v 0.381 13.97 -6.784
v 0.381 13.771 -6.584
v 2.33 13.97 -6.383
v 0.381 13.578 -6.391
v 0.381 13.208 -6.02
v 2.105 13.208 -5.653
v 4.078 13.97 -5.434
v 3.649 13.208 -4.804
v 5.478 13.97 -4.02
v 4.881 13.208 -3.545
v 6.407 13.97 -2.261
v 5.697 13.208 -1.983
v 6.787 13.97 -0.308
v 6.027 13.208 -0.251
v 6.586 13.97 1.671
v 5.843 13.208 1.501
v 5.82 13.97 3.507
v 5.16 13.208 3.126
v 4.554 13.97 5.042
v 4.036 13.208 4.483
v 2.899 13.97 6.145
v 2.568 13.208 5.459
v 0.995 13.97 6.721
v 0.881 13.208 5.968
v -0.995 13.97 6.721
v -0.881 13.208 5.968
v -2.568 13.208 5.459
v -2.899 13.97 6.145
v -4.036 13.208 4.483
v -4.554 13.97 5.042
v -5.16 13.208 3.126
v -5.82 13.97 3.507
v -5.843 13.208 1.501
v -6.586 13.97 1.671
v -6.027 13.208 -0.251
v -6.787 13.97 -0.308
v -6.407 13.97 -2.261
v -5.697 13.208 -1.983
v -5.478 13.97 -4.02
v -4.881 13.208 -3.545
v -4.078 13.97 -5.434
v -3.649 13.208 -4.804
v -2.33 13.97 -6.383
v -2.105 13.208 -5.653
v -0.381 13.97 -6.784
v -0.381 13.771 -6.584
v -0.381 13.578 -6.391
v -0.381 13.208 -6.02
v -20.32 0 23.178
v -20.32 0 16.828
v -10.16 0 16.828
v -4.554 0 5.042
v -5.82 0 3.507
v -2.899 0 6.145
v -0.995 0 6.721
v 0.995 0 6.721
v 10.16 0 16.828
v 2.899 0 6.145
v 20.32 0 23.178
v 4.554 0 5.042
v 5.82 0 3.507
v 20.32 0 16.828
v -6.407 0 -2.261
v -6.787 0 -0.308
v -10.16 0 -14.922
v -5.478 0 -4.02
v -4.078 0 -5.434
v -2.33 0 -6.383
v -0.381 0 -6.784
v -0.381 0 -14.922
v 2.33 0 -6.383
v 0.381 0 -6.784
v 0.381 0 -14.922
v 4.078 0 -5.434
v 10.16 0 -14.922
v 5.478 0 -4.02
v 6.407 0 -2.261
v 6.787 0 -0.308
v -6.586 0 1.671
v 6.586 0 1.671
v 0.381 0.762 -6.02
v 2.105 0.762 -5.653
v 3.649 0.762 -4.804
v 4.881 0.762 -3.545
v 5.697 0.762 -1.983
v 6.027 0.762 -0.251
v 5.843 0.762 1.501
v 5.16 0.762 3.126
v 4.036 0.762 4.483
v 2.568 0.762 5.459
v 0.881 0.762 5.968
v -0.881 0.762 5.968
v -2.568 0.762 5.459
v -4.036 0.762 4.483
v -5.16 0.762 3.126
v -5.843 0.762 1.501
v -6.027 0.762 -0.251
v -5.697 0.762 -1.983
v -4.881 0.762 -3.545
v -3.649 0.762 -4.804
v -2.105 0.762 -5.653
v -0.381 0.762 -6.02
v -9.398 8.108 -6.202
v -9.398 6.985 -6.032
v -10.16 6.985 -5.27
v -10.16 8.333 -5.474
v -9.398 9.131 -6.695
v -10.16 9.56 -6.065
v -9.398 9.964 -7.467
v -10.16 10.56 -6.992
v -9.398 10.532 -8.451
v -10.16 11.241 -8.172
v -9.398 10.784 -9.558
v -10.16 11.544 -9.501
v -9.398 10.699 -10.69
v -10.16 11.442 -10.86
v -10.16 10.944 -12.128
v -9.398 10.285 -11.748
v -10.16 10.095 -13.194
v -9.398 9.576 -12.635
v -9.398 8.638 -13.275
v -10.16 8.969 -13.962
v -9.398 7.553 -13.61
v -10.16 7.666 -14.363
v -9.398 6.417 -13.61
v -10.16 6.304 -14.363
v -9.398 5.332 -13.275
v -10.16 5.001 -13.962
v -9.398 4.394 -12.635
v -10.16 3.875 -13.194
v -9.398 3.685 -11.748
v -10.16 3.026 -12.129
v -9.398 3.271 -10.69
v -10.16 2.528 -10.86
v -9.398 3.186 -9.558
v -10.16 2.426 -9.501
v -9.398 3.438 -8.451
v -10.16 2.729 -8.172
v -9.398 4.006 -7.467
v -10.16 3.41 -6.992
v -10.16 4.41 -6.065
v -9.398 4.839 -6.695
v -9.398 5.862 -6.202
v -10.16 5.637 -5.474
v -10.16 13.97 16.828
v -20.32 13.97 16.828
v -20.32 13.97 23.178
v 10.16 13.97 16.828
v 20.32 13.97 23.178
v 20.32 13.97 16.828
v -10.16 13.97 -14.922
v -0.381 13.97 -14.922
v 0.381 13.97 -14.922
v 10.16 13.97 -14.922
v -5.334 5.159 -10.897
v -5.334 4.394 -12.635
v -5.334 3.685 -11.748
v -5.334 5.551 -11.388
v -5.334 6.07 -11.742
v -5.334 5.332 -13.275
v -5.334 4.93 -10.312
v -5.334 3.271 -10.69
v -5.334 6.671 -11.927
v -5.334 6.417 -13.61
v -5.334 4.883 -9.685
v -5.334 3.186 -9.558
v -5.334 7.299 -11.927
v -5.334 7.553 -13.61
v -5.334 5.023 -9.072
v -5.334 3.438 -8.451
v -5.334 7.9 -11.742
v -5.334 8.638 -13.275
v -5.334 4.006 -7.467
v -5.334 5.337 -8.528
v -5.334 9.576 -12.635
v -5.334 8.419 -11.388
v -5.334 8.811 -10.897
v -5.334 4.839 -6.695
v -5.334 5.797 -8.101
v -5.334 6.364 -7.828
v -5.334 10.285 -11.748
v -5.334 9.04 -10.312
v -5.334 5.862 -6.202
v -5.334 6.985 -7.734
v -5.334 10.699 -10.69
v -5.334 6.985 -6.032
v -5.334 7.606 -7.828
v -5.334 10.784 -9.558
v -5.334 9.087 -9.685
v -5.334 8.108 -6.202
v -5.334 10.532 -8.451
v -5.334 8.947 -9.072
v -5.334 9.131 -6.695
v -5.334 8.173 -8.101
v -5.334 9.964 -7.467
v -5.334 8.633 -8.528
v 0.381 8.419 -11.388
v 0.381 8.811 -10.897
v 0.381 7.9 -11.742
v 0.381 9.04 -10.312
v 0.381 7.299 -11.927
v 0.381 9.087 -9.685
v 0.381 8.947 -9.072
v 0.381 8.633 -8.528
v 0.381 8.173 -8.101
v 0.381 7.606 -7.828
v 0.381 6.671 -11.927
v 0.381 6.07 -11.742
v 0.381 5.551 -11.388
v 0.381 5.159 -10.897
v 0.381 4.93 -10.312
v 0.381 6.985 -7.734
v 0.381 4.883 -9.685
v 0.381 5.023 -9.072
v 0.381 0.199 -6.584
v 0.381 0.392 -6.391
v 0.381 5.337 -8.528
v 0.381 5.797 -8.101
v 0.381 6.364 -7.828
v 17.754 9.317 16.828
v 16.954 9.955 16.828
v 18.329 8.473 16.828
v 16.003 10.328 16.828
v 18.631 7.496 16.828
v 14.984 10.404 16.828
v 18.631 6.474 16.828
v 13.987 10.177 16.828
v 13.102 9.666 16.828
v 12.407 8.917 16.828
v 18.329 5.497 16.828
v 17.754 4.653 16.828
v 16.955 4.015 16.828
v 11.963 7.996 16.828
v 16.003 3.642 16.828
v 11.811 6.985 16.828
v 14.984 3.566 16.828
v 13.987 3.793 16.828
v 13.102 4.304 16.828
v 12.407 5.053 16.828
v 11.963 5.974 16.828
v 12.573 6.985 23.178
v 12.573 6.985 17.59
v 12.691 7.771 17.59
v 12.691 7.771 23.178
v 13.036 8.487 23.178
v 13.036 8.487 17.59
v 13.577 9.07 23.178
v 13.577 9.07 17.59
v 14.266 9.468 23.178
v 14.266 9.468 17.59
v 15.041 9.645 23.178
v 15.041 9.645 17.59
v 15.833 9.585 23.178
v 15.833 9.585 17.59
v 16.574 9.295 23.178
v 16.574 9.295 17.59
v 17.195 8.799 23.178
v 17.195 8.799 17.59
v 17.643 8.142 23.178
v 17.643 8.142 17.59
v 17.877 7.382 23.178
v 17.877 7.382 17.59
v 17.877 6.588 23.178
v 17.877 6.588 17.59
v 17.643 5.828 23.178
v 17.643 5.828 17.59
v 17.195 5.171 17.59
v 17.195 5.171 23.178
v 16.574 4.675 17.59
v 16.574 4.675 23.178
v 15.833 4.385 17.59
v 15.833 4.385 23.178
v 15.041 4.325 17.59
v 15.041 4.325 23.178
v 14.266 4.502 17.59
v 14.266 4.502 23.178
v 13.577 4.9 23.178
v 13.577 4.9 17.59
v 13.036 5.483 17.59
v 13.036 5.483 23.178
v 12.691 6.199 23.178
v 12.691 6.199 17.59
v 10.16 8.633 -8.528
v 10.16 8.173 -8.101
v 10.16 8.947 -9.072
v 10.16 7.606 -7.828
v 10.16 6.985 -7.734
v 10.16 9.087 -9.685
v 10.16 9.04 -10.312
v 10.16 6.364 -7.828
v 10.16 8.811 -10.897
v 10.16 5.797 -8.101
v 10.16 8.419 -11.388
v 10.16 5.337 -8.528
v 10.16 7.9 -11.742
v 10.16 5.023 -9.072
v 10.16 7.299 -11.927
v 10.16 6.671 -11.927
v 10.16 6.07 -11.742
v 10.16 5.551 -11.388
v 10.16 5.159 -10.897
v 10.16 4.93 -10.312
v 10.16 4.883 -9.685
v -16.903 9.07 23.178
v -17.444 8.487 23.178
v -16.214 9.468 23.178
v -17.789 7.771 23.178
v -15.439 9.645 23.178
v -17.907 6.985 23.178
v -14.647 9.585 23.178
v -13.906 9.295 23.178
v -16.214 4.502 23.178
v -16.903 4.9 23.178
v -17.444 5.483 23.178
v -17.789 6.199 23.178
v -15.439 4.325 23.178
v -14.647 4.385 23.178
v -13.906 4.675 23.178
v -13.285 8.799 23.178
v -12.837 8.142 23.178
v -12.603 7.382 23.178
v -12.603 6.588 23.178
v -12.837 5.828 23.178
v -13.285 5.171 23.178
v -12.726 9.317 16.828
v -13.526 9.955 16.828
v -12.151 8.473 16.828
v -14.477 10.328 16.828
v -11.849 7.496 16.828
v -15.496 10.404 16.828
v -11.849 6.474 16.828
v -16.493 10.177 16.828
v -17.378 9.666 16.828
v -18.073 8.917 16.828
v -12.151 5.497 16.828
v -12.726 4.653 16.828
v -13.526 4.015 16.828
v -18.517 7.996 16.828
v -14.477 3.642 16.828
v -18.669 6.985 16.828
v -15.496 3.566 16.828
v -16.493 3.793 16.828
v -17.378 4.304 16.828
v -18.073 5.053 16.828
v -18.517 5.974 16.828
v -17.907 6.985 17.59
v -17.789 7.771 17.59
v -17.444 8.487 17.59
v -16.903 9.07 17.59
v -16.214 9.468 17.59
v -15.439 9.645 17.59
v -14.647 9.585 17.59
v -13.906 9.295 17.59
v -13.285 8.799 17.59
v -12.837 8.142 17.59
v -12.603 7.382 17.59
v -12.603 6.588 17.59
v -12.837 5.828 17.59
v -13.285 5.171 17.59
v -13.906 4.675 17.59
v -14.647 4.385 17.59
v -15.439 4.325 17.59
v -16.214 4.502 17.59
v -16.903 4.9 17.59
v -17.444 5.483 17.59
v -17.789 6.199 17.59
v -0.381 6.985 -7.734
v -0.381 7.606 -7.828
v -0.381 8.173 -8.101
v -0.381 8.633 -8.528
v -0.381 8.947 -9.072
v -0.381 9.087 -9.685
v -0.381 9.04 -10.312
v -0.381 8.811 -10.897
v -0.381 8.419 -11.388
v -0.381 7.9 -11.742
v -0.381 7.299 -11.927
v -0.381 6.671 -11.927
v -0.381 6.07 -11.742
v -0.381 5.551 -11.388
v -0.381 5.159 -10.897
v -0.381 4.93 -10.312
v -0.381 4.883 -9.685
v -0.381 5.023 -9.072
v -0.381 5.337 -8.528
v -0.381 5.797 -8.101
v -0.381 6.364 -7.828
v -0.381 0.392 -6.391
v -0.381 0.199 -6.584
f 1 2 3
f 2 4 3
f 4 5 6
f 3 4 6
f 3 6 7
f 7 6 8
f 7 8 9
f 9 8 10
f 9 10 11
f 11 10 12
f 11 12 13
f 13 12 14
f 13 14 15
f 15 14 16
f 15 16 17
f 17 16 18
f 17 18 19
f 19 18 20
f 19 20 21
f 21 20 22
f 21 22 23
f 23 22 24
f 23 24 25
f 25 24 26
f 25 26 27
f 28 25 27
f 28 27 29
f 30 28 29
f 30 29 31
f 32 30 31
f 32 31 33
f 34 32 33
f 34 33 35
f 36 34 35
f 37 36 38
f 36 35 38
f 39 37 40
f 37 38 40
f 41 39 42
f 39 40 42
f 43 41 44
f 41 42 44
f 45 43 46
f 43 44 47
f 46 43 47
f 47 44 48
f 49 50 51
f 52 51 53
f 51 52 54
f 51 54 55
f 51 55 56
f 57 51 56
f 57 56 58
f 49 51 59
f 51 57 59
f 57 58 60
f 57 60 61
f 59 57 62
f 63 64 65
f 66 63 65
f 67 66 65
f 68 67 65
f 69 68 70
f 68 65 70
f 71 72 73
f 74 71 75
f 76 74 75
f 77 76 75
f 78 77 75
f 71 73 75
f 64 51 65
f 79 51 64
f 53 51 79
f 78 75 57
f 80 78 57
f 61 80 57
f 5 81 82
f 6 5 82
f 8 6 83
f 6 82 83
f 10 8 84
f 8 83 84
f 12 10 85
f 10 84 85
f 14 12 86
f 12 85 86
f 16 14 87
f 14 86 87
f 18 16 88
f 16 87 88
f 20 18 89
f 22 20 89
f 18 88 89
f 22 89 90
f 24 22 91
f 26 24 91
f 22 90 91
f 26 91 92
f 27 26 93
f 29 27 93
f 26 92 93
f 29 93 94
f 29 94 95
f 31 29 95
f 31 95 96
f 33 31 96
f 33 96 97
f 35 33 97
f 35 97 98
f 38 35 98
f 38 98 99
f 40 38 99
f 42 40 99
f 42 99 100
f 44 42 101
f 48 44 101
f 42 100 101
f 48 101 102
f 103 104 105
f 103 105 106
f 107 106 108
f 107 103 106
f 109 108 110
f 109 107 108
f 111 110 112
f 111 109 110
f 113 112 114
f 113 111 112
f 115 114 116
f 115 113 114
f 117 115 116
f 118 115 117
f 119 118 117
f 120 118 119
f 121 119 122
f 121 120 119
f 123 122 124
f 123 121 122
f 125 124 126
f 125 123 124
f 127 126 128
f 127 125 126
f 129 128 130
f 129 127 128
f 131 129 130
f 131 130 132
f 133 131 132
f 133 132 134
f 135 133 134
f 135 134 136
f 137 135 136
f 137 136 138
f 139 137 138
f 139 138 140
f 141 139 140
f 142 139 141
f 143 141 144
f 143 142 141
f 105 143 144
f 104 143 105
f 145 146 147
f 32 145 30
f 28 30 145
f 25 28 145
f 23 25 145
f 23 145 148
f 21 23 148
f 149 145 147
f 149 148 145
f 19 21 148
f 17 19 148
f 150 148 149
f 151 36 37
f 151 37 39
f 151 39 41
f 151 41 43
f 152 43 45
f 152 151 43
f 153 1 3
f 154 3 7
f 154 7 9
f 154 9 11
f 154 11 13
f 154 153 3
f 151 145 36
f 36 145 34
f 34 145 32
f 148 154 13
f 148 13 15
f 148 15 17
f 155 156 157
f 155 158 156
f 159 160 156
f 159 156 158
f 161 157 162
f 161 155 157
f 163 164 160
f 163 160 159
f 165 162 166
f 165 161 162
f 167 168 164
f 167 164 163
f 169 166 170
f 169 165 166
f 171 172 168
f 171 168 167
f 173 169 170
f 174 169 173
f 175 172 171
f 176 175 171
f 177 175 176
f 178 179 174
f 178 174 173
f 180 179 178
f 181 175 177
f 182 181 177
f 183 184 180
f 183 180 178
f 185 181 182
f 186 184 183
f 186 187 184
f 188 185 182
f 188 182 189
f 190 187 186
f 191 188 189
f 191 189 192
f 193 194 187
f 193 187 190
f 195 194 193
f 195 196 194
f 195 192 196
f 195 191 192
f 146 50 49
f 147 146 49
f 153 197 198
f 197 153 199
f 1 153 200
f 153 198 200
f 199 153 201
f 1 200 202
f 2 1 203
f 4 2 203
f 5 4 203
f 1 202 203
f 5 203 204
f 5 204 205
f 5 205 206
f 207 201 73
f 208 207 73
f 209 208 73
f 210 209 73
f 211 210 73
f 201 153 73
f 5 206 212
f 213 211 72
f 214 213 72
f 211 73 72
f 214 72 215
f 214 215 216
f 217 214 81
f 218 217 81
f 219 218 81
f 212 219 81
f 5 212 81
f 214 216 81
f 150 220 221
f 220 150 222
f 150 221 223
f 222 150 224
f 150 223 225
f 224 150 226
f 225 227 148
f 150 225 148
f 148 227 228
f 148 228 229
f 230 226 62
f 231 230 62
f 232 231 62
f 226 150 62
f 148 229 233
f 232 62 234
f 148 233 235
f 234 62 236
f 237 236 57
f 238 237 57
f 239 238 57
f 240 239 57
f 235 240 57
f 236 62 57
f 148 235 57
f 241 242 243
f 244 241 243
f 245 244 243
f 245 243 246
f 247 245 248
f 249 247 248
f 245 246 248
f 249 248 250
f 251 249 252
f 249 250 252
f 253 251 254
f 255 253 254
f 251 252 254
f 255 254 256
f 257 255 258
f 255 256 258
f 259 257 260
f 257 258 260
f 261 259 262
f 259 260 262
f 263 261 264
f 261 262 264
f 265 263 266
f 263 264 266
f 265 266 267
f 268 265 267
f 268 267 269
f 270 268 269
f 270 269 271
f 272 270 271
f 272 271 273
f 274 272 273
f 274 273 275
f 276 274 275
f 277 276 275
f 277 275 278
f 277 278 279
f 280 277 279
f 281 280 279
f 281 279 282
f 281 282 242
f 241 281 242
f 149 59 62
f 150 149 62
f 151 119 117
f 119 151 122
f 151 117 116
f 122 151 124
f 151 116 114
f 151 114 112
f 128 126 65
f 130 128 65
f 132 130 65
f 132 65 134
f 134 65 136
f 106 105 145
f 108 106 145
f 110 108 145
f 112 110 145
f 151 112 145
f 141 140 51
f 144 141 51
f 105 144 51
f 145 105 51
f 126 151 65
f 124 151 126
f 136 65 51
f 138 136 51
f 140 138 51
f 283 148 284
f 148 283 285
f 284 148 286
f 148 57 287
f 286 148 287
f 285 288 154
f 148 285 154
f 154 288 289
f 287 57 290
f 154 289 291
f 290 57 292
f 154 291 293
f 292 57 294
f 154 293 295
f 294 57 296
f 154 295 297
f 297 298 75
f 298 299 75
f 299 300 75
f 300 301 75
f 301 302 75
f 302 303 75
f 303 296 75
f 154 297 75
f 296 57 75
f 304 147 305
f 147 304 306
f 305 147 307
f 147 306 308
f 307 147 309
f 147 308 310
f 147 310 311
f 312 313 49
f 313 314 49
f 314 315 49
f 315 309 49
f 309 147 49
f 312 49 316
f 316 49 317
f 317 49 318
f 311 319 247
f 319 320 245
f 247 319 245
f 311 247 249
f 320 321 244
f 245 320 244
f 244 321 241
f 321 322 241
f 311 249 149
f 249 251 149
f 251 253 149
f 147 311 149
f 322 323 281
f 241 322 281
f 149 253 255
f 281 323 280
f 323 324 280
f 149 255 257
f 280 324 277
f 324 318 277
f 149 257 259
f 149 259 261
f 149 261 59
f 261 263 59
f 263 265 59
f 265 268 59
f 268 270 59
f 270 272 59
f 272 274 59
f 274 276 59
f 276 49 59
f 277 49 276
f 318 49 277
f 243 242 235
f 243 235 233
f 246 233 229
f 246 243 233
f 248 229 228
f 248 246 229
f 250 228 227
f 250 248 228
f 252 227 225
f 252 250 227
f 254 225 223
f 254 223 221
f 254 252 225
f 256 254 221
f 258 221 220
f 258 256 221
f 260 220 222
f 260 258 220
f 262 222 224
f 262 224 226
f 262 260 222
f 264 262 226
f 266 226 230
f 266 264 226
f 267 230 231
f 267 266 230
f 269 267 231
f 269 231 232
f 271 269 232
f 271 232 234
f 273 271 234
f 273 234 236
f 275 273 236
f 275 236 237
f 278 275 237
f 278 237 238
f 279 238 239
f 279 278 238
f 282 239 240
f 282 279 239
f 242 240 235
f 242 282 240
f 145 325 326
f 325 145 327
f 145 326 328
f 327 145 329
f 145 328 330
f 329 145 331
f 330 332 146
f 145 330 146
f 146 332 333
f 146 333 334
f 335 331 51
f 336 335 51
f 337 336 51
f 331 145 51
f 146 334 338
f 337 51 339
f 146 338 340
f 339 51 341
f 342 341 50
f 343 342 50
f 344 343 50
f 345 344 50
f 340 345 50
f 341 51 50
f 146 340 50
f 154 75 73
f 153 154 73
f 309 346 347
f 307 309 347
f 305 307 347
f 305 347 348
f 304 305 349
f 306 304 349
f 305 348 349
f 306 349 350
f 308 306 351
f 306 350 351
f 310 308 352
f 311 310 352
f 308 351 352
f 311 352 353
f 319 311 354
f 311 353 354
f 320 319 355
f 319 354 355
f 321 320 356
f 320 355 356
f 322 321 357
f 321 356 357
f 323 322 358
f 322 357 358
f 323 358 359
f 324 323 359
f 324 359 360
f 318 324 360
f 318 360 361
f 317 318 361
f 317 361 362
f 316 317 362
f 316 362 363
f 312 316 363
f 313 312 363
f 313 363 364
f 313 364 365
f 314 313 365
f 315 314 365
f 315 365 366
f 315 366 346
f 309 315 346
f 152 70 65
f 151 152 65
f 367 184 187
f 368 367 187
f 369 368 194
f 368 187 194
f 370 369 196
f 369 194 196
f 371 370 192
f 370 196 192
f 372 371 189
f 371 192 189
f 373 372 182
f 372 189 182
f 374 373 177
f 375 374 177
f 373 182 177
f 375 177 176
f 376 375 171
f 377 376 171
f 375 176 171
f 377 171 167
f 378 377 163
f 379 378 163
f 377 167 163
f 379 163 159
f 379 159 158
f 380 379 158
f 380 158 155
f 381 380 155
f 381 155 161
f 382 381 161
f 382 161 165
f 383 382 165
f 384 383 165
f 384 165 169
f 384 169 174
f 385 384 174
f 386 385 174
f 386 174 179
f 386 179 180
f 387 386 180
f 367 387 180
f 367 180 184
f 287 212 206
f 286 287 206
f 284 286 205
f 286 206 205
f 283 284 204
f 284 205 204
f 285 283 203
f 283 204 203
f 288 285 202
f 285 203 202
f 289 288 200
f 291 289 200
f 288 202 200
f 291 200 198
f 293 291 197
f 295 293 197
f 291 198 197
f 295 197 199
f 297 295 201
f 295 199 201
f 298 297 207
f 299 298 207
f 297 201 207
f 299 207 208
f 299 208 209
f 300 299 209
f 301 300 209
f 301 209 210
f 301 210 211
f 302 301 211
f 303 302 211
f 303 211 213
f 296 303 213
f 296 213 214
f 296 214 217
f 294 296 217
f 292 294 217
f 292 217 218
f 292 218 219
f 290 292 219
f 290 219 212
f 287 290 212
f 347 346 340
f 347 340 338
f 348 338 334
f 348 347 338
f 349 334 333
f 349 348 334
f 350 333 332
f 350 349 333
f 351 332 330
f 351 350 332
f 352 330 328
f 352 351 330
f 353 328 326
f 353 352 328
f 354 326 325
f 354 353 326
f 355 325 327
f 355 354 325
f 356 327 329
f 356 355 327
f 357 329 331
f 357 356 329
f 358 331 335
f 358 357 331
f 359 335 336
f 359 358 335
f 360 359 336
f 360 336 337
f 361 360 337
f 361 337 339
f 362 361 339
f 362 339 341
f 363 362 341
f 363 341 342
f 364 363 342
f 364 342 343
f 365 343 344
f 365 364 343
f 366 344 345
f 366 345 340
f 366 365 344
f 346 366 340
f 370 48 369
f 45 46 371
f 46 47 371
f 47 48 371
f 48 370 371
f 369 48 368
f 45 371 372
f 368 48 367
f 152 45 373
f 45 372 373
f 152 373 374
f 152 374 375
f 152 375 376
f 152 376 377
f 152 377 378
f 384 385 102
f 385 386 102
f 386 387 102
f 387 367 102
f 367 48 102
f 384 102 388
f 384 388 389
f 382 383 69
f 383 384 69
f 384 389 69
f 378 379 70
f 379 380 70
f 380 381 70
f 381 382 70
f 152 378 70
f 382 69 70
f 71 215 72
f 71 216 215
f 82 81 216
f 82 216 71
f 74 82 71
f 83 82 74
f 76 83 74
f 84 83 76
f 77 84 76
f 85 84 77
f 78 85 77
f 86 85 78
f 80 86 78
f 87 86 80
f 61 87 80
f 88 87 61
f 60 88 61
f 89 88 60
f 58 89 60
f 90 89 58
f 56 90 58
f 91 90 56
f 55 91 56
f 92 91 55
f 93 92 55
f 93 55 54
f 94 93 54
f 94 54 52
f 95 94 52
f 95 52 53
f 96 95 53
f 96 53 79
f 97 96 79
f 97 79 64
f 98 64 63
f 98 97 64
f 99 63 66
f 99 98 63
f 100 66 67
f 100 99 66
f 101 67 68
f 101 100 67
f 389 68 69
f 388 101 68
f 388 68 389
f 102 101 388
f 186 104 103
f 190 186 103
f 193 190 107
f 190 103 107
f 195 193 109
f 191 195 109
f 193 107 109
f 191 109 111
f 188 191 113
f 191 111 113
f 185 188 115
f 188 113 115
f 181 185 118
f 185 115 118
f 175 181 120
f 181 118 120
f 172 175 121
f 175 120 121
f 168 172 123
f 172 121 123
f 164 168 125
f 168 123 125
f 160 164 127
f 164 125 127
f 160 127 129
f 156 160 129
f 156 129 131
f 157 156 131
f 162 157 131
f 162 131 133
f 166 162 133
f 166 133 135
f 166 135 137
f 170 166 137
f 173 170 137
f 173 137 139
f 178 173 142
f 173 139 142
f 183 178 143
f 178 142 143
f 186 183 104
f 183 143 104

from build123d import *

# Parameters (mm, degrees)
BOSS_EXTRUDE1_DEPTH = 13.97
SKETCH2_R           = 2.667
CUT_EXTRUDE1_DEPTH  = 13.97
SKETCH3_R           = 3.81
CUT_EXTRUDE2_DEPTH  = 4.826
SKETCH4_R           = 2.1082
CUT_EXTRUDE3_DEPTH  = 17.272
CHAMFER1_SIZE       = 0.762


with BuildPart() as part:
    # Sketch1 → Boss-Extrude1 (new body)
    with BuildSketch(Plane(origin=(0, 0, 0), x_dir=(1, 0, 0), z_dir=(0, 1, 0))):
        with BuildLine():
            Line((10.16, 14.9225), (0.381, 14.9225))
            Line((0.381, 14.9225), (0.381, 6.020456399))
            ThreePointArc((0.381, 6.020456399), (0, -6.0325), (-0.381, 6.020456399))
            Line((-0.381, 6.020456399), (-0.381, 14.9225))
            Line((-0.381, 14.9225), (-10.16, 14.9225))
            Line((-10.16, 14.9225), (-10.16, -16.8275))
            Line((-10.16, -16.8275), (-20.32, -16.8275))
            Line((-20.32, -16.8275), (-20.32, -23.1775))
            Line((-20.32, -23.1775), (20.32, -23.1775))
            Line((20.32, -23.1775), (20.32, -16.8275))
            Line((20.32, -16.8275), (10.16, -16.8275))
            Line((10.16, -16.8275), (10.16, 14.9225))
        make_face()
    extrude(amount=BOSS_EXTRUDE1_DEPTH)

    # Sketch2 → Cut-Extrude1 (cut)
    with BuildSketch(Plane(origin=(0, 0, 16.8275), x_dir=(-1, 0, 0), z_dir=(0, 0, -1))):
        with Locations((-15.24, 6.985)):
            Circle(SKETCH2_R)
        with Locations((15.24, 6.985)):
            Circle(SKETCH2_R)
    extrude(amount=-CUT_EXTRUDE1_DEPTH, mode=Mode.SUBTRACT)

    # Sketch3 → Cut-Extrude2 (cut)
    with BuildSketch(Plane.ZY.offset(10.16)):
        with Locations((-9.8425, 6.985)):
            Circle(SKETCH3_R)
    extrude(amount=-CUT_EXTRUDE2_DEPTH, mode=Mode.SUBTRACT)

    # Sketch4 → Cut-Extrude3 (cut)
    with BuildSketch(Plane.ZY.offset(5.334)):
        with Locations((-9.8425, 6.985)):
            Circle(SKETCH4_R)
    extrude(amount=-CUT_EXTRUDE3_DEPTH, mode=Mode.SUBTRACT)

    # Chamfer1
    chamfer1_edges = [part.edges().sort_by_distance(p)[0] for p in [
        (0, 0, 6.0325),
        (0, 13.97, 6.0325),
        (17.907, 6.985, 16.8275),
        (-12.573, 6.985, 16.8275),
        (-10.16, 6.985, -13.6525),
    ]]
    chamfer(chamfer1_edges, length=CHAMFER1_SIZE)


solid = part.part
